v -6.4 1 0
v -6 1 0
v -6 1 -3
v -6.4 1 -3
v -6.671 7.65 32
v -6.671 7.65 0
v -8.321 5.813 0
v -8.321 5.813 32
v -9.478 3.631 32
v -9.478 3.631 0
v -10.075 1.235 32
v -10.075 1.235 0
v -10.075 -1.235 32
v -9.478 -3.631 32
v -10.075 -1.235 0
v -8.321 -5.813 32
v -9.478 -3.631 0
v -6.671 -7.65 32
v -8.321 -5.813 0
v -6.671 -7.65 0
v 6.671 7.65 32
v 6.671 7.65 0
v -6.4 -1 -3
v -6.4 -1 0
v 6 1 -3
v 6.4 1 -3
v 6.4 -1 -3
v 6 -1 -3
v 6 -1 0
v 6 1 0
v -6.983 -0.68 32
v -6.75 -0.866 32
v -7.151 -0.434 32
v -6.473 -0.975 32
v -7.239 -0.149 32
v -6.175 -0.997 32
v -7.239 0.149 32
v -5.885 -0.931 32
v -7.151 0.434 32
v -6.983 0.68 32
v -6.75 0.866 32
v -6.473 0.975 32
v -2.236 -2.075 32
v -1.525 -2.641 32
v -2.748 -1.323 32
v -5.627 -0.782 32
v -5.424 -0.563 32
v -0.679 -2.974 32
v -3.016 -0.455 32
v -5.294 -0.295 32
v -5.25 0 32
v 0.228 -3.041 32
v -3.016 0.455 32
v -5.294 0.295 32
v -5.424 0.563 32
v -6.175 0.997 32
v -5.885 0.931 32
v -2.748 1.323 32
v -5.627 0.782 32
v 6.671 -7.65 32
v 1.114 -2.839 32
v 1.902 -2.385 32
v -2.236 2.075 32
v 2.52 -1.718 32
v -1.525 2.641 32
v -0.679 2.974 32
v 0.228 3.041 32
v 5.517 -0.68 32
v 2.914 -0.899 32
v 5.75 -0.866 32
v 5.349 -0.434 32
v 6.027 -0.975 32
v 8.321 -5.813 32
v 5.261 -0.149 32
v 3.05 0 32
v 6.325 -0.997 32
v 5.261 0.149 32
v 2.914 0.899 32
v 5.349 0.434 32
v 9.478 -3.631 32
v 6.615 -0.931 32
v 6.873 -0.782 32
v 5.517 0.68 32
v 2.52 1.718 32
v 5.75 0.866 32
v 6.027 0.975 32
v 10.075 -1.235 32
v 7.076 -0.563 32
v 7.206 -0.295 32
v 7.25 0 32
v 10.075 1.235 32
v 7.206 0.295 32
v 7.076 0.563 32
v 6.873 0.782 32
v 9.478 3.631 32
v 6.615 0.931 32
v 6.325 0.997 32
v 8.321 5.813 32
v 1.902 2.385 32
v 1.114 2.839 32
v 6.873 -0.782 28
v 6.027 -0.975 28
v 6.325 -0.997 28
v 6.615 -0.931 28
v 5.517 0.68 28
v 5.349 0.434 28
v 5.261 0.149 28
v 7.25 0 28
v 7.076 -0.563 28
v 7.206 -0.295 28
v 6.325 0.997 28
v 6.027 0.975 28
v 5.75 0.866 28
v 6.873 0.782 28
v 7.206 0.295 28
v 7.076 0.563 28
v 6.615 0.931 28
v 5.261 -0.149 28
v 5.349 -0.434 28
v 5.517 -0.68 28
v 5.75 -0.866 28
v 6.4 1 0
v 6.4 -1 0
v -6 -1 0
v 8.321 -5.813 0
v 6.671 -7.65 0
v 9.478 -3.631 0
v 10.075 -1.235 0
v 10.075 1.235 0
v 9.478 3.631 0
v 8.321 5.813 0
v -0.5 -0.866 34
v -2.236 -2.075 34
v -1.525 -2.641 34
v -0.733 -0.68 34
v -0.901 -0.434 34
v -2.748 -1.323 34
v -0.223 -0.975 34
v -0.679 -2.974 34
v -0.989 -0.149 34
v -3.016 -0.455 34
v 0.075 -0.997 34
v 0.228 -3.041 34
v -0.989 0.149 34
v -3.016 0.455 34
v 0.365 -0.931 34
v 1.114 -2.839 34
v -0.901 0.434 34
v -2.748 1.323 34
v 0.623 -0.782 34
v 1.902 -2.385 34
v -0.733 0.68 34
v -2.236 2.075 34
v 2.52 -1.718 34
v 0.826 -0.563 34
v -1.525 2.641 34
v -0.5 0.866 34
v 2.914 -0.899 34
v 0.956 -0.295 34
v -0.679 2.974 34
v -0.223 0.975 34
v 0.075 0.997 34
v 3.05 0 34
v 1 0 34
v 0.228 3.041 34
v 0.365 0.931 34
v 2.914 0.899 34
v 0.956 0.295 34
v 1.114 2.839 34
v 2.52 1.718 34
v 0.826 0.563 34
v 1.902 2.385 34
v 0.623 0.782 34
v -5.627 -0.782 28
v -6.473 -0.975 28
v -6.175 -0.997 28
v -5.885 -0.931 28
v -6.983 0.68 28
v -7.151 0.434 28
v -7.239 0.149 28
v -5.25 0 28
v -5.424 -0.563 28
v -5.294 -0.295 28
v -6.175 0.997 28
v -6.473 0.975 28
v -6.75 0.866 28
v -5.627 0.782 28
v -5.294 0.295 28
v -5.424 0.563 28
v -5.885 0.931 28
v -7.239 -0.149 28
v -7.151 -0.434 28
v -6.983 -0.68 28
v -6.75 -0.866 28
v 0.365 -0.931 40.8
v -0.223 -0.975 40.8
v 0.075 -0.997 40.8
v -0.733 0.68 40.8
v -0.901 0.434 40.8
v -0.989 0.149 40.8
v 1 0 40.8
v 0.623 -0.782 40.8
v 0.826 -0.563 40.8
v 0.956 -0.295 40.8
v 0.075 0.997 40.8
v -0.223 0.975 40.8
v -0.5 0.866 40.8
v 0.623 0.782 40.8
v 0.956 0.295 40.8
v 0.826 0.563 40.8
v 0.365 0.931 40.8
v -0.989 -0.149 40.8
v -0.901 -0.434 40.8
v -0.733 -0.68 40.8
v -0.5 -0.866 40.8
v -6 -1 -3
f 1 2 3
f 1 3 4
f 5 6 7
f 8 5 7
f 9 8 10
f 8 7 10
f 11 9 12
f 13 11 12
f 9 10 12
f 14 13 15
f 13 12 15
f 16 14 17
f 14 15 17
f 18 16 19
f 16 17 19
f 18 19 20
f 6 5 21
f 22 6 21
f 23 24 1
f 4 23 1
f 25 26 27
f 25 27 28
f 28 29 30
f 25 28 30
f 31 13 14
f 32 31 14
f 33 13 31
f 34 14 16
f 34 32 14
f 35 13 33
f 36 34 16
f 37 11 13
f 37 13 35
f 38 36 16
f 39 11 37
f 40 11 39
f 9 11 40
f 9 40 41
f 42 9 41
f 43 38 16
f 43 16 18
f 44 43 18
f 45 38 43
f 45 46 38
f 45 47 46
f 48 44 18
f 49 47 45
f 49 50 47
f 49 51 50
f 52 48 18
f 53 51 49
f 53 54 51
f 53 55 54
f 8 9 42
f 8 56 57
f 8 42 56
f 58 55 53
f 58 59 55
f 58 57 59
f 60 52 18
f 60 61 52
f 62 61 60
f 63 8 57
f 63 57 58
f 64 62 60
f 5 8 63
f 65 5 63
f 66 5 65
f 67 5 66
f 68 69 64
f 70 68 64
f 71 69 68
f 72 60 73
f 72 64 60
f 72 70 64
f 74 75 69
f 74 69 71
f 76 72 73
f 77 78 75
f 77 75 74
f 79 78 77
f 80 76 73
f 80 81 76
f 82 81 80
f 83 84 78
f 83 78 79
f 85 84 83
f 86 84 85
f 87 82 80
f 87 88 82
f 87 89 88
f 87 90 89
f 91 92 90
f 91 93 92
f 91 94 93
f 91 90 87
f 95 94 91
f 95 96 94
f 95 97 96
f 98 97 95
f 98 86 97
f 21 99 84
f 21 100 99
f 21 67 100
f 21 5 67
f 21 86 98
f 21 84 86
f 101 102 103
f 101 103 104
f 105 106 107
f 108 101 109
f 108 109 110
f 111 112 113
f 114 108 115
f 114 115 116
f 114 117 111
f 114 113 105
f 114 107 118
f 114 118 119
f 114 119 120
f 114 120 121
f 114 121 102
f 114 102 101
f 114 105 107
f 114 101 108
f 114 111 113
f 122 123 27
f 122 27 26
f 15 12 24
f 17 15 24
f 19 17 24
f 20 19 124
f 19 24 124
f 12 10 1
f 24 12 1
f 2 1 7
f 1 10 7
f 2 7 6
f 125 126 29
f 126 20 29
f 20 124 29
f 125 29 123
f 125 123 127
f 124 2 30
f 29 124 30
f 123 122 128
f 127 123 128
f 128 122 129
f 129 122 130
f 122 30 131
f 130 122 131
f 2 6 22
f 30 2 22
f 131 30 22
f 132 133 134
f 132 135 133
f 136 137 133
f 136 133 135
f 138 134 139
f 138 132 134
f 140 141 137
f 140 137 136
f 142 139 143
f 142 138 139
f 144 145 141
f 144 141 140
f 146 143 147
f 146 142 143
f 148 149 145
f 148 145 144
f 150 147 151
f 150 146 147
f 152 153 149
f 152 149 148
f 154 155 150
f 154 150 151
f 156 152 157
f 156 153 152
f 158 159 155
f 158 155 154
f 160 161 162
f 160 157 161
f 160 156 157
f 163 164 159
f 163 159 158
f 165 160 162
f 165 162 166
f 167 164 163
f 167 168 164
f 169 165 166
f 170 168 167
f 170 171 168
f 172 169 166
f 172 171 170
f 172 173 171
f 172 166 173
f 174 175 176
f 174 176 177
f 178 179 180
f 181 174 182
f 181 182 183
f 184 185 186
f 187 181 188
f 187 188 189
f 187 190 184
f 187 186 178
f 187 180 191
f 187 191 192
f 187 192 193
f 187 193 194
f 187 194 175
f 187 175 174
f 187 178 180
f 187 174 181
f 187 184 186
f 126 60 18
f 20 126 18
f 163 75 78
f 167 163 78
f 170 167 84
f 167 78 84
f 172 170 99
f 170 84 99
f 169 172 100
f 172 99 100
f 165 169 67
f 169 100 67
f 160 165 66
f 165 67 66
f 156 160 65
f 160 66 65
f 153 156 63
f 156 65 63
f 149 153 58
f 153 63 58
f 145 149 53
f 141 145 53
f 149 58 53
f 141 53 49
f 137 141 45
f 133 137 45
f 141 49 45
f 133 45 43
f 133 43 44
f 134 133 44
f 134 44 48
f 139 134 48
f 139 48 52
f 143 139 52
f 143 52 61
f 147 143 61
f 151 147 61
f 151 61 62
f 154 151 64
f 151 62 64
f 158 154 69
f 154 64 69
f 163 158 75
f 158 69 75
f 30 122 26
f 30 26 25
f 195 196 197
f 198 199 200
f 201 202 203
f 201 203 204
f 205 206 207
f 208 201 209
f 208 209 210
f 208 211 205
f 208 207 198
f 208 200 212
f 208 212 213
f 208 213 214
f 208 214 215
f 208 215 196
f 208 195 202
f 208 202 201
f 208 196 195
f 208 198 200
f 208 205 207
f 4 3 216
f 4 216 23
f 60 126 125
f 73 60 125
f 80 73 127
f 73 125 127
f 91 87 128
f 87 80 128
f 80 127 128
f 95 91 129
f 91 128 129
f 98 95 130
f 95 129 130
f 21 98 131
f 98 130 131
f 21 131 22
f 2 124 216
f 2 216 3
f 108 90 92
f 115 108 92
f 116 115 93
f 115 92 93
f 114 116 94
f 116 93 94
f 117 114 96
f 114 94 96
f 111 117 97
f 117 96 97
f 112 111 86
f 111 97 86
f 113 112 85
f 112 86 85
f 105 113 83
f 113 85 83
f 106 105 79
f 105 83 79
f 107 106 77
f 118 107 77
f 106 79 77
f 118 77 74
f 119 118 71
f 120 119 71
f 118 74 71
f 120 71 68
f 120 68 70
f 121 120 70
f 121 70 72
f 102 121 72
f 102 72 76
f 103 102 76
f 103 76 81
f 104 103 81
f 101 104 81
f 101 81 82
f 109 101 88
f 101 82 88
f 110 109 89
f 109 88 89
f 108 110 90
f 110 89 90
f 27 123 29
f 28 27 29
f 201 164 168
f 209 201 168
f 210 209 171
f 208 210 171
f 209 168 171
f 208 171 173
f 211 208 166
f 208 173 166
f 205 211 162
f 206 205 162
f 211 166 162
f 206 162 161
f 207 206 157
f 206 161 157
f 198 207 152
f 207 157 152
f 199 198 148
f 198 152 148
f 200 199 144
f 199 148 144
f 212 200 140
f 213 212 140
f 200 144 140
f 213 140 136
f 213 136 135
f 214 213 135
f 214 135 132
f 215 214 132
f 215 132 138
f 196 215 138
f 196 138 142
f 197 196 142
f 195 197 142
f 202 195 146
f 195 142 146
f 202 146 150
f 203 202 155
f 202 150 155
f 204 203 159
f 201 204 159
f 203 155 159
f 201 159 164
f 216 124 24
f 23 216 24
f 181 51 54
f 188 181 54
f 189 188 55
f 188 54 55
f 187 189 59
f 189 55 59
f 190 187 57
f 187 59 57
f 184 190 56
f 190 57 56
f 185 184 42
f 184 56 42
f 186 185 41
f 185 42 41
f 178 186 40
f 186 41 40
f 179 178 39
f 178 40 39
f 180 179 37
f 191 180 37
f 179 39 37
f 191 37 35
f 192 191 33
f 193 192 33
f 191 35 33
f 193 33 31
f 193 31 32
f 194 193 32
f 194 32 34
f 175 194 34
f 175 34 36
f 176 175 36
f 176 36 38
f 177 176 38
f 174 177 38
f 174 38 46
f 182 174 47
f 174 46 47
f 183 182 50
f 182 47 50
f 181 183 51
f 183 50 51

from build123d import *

# Parameters (mm, degrees)
SKETCH_1_R          = 10.15
EXTRUDE_1_DEPTH     = 32
CUT_EXTRUDE_1_DEPTH = 33
SKETCH_4_W          = 0.4
SKETCH_4_H          = 2
EXTRUDE_2_DEPTH     = 3
SKETCH_6_R          = 1
CUT_EXTRUDE_2_DEPTH = 4
SKETCH_6_4_R        = 3.05
EXTRUDE_3_DEPTH     = 2
SKETCH_7_R          = 1
EXTRUDE_4_DEPTH     = 6.8


with BuildPart() as part:
    # 草图1 → 凸台-拉伸1 (new body)
    with BuildSketch(Plane.XY):
        Circle(SKETCH_1_R)
    extrude(amount=EXTRUDE_1_DEPTH)

    # 草图3 → 切除-拉伸1 (cut, through all)
    with BuildSketch(Plane.XY.offset(32)):
        with BuildLine():
            ThreePointArc((6.670832032, 7.65), (0, 10.15), (-6.670832032, 7.65))
            Line((-6.670832032, 7.65), (6.670832032, 7.65))
        make_face()
        with BuildLine():
            Line((6.670832032, -7.65), (-6.670832032, -7.65))
            ThreePointArc((-6.670832032, -7.65), (0, -10.15), (6.670832032, -7.65))
        make_face()
    extrude(amount=-CUT_EXTRUDE_1_DEPTH, mode=Mode.SUBTRACT)

    # 草图4 → 凸台-拉伸2 (add)
    with BuildSketch(Plane(origin=(0, 0, 0), x_dir=(-1, 0, 0), z_dir=(0, 0, -1))):
        with Locations((6.2, 0)):
            Rectangle(SKETCH_4_W, SKETCH_4_H)
        with Locations((-6.2, 0)):
            Rectangle(SKETCH_4_W, SKETCH_4_H)
    extrude(amount=EXTRUDE_2_DEPTH)

    # 草图6 → 切除-拉伸2 (cut)
    with BuildSketch(Plane.XY.offset(32)):
        with Locations((-6.25, 0)):
            Circle(SKETCH_6_R)
        with Locations((6.25, 0)):
            Circle(SKETCH_6_R)
    extrude(amount=-CUT_EXTRUDE_2_DEPTH, mode=Mode.SUBTRACT)

    # 草图6<4> → 凸台-拉伸3 (add)
    with BuildSketch(Plane.XY.offset(32)):
        Circle(SKETCH_6_4_R)
    extrude(amount=EXTRUDE_3_DEPTH)

    # 草图7 → 凸台-拉伸4 (add)
    with BuildSketch(Plane.XY.offset(34)):
        Circle(SKETCH_7_R)
    extrude(amount=EXTRUDE_4_DEPTH)


solid = part.part
